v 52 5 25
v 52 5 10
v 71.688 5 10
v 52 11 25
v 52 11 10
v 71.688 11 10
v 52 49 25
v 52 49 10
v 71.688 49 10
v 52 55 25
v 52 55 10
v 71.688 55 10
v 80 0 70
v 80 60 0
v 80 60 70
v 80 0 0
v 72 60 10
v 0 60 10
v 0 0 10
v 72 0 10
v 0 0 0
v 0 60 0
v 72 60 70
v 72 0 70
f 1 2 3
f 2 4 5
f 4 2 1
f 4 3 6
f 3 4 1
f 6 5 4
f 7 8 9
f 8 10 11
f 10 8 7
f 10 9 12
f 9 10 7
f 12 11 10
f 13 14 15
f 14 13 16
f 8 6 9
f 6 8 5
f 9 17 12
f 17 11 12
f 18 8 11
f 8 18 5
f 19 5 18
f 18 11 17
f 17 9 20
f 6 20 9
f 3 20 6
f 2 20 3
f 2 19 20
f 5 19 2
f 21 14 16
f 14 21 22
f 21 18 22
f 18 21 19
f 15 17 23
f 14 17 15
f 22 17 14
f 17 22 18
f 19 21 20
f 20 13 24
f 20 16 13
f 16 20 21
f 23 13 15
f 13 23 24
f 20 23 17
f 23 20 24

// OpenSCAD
$fn = 32;

// ----------------------------------------------------------------------
// Rib bracket: 2-gusset L bracket
// ----------------------------------------------------------------------

// --- parameters (mm) ---
base_l = 80;              // foot length, X
base_w = 60;              // foot width, Y
base_t = 10;              // foot thickness
plate_t = 8;              // upright plate thickness
plate_h = 70;             // overall height
gus_l = 20;               // gusset leg along the foot
gus_h = 16;               // gusset height
gus_t = 6;                // gusset thickness
gus_edge = 5;             // gusset margin from the foot edge
n_gus = 2;                // gusset count

gus_pitch = (base_w - 2 * gus_edge - gus_t) / (n_gus - 1);  // gusset pitch

union() {
  cube([base_l, base_w, base_t]);
  translate([base_l - plate_t, 0, base_t - 1])
    cube([plate_t, base_w, plate_h - base_t + 1]);
  for (i = [0 : n_gus - 1])
    translate([base_l - plate_t - gus_l, gus_edge + i * gus_pitch, base_t - 1])
      rotate([-90, 0, 0])
        linear_extrude(height = gus_t)
          polygon(points = [[0, 0], [gus_l + 1, 0], [0, -gus_h]]);
}
